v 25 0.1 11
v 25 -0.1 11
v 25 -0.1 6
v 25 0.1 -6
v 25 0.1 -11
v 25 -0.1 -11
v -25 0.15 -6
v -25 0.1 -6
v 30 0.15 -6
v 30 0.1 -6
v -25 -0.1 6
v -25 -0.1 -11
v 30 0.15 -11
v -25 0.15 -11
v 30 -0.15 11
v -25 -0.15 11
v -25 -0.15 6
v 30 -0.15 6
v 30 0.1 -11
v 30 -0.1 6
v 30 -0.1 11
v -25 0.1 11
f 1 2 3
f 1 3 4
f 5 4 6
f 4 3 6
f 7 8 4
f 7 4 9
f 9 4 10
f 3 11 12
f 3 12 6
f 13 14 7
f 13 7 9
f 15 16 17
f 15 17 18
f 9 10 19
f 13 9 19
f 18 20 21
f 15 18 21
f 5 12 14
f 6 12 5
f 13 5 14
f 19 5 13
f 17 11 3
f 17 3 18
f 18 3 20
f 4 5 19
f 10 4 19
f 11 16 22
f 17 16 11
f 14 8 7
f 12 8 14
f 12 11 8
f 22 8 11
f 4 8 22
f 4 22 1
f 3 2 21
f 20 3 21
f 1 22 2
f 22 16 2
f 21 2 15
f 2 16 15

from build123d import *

# Parameters (mm, degrees)
SKETCH1_W           = 50
SKETCH1_H           = 22
BOSS_EXTRUDE1_DEPTH = 0.1
SKETCH2_W           = 55
SKETCH2_H           = 5
BOSS_EXTRUDE2_DEPTH = 0.05
CIRPATTERN1_COUNT   = 2


with BuildPart() as part:
    # Sketch1 → Boss-Extrude1 (new body)
    with BuildSketch(Plane(origin=(0, 0, 0), x_dir=(1, 0, 0), z_dir=(0, 1, 0))):
        Rectangle(SKETCH1_W, SKETCH1_H)
    extrude(amount=BOSS_EXTRUDE1_DEPTH)

    # Sketch2 → Boss-Extrude2 (add)
    with BuildSketch(Plane(origin=(0, 0.1, 0), x_dir=(1, 0, 0), z_dir=(0, 1, 0))):
        with Locations((2.5, 8.5)):
            Rectangle(SKETCH2_W, SKETCH2_H)
    extrude(amount=BOSS_EXTRUDE2_DEPTH)


with BuildPart() as cirpattern1_1:
    # CirPattern1: pattern copy
    add(part.part.rotate(Axis((-27.75005375, 0, 0), (1, 0, 0)), 1 * 360 / CIRPATTERN1_COUNT))

    # Combine2: union part
    add(part.part)


solid = cirpattern1_1.part
